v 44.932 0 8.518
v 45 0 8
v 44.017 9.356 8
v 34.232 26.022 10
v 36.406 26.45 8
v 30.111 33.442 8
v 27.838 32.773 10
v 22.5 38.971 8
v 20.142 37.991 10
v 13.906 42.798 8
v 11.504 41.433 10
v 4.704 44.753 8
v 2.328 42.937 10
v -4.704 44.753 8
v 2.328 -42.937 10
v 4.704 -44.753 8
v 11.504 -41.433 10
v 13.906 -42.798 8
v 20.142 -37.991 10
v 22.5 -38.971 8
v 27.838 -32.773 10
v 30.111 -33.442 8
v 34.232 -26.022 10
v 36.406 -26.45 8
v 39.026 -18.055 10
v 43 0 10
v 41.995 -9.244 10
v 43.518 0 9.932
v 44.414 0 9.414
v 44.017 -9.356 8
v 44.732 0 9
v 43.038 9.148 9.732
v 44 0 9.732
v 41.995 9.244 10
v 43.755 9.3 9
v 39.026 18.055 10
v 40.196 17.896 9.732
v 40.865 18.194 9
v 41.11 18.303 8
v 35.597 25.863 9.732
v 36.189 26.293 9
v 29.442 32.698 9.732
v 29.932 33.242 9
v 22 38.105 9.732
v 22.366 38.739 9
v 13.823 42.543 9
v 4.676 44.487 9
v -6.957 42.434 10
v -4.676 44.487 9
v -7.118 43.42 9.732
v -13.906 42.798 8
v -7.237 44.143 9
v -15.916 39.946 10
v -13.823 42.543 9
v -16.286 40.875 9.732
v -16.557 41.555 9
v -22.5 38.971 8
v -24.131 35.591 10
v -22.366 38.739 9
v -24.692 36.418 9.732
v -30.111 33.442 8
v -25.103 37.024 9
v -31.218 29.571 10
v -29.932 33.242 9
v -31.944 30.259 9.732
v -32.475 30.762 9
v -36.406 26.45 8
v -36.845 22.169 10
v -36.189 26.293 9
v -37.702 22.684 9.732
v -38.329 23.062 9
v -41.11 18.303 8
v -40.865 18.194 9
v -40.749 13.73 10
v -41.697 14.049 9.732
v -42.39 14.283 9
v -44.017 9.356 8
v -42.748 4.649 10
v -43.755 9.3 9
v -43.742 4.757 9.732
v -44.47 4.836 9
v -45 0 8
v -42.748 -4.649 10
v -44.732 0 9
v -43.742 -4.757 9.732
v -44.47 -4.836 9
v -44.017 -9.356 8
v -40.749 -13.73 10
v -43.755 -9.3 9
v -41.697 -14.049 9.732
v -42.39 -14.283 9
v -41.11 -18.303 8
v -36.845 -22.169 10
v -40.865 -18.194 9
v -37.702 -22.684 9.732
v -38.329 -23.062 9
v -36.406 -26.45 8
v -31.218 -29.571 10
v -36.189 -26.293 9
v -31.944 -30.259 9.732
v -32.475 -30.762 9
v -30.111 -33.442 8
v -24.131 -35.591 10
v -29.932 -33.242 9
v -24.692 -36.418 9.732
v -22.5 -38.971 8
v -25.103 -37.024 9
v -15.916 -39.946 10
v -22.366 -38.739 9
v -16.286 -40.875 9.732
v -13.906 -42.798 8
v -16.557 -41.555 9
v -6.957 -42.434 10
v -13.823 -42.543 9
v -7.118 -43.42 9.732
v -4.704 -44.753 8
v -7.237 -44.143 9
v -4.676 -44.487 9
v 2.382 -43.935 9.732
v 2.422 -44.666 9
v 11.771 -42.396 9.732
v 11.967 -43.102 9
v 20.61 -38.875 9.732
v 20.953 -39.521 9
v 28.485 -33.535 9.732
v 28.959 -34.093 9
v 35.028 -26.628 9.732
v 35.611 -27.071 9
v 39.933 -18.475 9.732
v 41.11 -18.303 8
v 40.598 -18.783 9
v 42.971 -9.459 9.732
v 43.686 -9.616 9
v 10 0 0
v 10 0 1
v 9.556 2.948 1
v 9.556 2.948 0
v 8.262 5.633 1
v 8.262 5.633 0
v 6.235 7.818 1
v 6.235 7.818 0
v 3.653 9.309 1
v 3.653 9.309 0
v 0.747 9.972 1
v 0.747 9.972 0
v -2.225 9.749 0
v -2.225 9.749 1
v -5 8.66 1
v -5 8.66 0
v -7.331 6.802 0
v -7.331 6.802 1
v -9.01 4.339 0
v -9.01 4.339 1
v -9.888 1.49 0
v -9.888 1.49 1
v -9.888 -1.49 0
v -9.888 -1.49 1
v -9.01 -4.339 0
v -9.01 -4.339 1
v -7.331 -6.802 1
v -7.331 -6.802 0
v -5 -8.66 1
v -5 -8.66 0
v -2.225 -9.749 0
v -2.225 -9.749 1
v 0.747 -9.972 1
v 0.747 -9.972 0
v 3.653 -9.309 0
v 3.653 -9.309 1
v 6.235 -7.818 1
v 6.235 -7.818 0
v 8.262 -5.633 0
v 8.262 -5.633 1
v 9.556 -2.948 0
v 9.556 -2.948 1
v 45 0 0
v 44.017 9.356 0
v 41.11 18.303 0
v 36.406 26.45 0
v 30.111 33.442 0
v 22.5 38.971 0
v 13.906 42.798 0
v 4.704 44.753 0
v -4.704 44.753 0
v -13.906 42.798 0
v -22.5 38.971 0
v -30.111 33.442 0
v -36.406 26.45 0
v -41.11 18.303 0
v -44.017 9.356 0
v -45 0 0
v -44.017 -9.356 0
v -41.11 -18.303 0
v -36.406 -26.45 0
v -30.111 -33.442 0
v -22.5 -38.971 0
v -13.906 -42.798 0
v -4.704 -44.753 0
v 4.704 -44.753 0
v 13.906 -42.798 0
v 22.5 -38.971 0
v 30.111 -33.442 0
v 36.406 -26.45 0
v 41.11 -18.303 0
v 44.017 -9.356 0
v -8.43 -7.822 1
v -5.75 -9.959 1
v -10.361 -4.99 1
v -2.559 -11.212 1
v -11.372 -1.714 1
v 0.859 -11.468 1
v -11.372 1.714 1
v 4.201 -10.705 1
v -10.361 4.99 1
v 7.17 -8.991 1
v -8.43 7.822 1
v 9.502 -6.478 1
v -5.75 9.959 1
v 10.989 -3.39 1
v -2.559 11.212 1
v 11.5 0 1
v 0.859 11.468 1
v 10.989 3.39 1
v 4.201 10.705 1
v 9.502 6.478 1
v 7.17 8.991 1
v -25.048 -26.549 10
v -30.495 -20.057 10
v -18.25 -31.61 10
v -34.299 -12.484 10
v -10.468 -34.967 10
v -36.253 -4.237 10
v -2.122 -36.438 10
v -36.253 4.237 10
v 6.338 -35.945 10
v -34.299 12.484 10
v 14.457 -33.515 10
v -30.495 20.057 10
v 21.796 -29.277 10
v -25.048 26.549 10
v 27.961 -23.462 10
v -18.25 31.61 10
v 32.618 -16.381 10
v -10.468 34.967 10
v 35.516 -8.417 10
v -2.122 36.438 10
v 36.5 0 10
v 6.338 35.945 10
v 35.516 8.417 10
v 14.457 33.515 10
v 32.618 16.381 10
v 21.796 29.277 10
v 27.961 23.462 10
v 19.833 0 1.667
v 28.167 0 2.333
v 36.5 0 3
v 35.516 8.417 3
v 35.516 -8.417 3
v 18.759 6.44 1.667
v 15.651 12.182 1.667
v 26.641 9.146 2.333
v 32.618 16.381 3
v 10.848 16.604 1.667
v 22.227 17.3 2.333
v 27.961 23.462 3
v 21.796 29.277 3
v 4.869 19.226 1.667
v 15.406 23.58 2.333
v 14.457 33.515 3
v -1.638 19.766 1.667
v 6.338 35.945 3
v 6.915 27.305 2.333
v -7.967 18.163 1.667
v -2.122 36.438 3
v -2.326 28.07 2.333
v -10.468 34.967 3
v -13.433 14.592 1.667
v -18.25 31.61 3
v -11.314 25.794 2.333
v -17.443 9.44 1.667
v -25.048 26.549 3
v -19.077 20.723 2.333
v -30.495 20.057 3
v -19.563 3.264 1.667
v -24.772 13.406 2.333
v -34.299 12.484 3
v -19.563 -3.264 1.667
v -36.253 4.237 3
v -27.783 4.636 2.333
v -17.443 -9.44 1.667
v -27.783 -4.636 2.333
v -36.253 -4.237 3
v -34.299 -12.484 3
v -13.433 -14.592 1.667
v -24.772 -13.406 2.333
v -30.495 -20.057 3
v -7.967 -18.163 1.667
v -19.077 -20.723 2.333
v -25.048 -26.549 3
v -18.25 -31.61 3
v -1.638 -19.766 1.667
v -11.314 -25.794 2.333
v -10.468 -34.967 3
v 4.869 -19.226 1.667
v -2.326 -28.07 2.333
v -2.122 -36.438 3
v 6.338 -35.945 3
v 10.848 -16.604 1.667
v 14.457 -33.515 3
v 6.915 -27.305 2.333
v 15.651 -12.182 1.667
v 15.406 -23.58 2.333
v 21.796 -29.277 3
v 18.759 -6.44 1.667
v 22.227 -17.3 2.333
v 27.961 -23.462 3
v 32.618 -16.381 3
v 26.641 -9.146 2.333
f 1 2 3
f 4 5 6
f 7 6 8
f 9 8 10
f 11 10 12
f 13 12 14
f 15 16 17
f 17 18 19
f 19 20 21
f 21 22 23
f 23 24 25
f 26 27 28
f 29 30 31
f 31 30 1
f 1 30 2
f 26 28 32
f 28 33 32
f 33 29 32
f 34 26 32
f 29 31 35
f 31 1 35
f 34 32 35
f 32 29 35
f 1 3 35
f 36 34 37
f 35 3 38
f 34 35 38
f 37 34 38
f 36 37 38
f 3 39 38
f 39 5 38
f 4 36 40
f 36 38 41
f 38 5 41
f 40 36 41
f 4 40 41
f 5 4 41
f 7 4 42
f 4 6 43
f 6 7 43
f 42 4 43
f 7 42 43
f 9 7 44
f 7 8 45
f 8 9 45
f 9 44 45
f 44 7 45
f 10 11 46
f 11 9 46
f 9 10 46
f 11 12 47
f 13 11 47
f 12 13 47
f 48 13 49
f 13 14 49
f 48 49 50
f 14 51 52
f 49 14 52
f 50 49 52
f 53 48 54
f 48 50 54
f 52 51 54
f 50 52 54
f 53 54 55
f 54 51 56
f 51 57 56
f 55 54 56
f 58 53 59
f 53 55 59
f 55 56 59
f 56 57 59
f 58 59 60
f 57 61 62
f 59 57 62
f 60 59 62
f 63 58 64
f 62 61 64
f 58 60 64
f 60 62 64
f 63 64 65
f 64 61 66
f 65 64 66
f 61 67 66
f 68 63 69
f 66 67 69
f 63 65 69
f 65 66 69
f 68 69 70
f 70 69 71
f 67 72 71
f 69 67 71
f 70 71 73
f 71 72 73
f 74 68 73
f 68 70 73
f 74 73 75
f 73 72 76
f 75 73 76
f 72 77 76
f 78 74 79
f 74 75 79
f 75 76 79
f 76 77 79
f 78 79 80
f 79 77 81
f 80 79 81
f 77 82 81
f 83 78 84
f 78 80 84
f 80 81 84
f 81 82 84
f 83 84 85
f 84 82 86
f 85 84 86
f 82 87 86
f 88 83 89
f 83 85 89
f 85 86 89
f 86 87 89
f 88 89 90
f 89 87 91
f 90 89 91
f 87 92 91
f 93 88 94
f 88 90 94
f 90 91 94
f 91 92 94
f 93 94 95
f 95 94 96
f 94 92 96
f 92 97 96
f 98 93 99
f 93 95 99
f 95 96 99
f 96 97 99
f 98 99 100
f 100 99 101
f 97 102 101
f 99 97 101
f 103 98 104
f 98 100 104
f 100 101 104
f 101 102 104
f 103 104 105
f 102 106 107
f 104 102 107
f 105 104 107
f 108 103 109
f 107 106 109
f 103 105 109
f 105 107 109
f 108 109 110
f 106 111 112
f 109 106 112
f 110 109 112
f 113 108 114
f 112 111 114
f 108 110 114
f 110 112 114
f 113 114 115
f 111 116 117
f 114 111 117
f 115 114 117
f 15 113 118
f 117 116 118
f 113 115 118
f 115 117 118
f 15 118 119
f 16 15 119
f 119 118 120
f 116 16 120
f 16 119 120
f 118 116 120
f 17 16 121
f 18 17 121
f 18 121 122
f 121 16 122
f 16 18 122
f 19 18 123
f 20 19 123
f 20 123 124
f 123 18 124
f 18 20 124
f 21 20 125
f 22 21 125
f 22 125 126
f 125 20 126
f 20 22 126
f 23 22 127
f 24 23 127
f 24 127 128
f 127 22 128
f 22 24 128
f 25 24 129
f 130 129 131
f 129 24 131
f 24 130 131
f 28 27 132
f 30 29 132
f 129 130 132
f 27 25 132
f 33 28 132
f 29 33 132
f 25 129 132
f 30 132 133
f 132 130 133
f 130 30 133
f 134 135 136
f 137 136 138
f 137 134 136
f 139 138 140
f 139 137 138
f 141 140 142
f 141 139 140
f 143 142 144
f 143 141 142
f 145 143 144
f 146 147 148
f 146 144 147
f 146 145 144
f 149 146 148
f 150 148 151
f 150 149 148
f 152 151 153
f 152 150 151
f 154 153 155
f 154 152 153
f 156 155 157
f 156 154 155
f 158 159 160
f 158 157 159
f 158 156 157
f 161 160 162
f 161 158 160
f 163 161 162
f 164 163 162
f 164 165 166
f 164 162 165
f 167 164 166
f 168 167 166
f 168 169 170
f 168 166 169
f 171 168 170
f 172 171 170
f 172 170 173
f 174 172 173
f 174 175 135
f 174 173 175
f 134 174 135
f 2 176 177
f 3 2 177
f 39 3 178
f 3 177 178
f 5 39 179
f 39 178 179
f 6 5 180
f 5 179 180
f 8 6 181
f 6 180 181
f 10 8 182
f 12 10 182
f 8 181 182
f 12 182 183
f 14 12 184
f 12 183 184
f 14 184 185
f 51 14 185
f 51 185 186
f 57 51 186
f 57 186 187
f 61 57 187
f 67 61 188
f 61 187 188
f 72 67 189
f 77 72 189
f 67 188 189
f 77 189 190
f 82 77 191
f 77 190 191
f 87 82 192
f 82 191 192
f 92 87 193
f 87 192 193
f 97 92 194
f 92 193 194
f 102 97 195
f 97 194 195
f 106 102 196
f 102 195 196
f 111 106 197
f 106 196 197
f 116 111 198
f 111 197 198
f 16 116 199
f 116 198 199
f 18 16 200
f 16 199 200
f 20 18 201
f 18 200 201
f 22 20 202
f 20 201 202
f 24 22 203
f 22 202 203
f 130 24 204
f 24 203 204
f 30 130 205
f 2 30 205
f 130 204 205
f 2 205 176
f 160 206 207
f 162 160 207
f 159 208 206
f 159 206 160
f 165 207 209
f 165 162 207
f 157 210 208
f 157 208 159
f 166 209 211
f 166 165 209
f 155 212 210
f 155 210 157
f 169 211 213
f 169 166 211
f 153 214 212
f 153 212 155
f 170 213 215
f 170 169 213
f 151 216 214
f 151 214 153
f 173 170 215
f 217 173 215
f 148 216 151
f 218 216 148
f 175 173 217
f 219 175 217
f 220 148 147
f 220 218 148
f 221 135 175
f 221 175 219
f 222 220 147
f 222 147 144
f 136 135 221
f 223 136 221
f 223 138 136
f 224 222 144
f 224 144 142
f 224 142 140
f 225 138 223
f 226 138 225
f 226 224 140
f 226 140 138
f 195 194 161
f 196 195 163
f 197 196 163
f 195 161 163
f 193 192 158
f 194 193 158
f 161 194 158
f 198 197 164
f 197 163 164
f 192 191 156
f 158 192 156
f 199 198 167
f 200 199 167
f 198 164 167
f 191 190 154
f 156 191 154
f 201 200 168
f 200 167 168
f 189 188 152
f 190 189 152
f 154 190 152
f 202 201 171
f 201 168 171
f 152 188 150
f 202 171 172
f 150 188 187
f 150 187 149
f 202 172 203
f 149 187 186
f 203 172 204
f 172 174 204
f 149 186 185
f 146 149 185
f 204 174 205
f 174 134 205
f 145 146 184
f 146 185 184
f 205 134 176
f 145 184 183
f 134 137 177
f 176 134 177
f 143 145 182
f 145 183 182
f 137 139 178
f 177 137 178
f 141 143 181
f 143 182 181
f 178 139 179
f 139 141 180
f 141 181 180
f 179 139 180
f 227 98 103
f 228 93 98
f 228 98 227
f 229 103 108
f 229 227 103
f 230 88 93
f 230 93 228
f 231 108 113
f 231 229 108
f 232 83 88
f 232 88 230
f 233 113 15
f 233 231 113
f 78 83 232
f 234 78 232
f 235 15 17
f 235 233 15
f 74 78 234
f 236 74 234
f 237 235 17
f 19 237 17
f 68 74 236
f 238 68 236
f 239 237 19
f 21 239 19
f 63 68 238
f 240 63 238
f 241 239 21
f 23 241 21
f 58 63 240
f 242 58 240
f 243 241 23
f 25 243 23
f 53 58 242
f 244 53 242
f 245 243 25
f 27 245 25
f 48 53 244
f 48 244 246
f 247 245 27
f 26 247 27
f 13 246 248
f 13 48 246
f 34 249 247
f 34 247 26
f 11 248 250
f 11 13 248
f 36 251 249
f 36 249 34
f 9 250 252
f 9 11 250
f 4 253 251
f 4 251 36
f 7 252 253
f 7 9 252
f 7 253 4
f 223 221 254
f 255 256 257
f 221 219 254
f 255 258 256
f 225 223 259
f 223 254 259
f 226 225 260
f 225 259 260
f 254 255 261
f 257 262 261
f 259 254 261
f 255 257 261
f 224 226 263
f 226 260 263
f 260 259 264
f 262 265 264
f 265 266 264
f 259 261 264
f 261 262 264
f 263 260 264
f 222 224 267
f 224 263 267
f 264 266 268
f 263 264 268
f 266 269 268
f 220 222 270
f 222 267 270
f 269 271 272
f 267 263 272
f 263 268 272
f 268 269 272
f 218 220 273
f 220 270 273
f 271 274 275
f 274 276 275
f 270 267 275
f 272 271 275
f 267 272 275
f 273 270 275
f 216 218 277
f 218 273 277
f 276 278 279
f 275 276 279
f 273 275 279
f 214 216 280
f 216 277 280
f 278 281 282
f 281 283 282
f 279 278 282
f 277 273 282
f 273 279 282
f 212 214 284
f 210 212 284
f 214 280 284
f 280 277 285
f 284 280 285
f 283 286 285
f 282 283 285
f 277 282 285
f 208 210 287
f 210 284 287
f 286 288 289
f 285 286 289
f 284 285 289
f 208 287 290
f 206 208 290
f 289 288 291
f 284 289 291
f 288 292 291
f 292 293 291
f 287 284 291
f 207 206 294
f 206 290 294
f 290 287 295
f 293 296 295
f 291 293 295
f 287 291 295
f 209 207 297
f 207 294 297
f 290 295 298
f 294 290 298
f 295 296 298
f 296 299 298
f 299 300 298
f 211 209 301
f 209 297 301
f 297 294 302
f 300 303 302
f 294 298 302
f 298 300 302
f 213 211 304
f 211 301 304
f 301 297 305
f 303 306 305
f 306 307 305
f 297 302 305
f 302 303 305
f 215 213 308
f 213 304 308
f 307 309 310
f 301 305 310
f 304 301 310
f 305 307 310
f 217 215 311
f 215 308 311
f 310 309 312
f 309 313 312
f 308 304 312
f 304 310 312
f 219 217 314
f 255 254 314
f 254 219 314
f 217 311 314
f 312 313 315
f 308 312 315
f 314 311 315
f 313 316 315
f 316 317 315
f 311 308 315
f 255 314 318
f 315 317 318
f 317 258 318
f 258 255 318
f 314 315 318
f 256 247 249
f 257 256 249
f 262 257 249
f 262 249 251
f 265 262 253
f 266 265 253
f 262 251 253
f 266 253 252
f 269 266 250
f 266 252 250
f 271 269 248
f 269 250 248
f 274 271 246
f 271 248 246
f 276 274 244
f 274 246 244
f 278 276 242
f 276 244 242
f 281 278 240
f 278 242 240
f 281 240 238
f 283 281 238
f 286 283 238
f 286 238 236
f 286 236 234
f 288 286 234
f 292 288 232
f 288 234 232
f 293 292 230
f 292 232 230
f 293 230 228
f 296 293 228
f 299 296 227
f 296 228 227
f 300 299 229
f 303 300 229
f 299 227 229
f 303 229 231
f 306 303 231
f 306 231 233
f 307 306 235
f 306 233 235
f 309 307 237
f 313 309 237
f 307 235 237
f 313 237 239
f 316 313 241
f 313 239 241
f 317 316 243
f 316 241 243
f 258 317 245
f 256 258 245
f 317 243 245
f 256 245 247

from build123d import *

# Parameters (mm, degrees)
F0_R     = 45
F0_R_2   = 10
F1_DEPTH = 10
F2_R     = 36.5
F3_DEPTH = 9
F4_SIZE2 = 2
F4_SIZE  = 25
F5_R     = 2


with BuildPart() as f1:
    # F0 (on Top) → F1 (new body)
    with BuildSketch(Plane.XY):
        Circle(F0_R)
        Circle(F0_R_2, mode=Mode.SUBTRACT)
    extrude(amount=F1_DEPTH)

    # F2 (on face) → F3 (cut)
    with BuildSketch(Plane.XY.offset(10)):
        Circle(F2_R)
    extrude(amount=-F3_DEPTH, mode=Mode.SUBTRACT)

    # F4
    f4_edges = [f1.edges().sort_by_distance(p)[0] for p in [
        (-36.5, 0, 1),
    ]]
    f4_side = f1.faces().sort_by_distance((-35.467624, 0, 1))[0]
    chamfer(f4_edges, length=F4_SIZE, length2=F4_SIZE2, reference=f4_side)

    # F5
    f5_edges = [f1.edges().sort_by_distance(p)[0] for p in [
        (-45, 0, 10),
    ]]
    fillet(f5_edges, radius=F5_R)


solid = f1.part
